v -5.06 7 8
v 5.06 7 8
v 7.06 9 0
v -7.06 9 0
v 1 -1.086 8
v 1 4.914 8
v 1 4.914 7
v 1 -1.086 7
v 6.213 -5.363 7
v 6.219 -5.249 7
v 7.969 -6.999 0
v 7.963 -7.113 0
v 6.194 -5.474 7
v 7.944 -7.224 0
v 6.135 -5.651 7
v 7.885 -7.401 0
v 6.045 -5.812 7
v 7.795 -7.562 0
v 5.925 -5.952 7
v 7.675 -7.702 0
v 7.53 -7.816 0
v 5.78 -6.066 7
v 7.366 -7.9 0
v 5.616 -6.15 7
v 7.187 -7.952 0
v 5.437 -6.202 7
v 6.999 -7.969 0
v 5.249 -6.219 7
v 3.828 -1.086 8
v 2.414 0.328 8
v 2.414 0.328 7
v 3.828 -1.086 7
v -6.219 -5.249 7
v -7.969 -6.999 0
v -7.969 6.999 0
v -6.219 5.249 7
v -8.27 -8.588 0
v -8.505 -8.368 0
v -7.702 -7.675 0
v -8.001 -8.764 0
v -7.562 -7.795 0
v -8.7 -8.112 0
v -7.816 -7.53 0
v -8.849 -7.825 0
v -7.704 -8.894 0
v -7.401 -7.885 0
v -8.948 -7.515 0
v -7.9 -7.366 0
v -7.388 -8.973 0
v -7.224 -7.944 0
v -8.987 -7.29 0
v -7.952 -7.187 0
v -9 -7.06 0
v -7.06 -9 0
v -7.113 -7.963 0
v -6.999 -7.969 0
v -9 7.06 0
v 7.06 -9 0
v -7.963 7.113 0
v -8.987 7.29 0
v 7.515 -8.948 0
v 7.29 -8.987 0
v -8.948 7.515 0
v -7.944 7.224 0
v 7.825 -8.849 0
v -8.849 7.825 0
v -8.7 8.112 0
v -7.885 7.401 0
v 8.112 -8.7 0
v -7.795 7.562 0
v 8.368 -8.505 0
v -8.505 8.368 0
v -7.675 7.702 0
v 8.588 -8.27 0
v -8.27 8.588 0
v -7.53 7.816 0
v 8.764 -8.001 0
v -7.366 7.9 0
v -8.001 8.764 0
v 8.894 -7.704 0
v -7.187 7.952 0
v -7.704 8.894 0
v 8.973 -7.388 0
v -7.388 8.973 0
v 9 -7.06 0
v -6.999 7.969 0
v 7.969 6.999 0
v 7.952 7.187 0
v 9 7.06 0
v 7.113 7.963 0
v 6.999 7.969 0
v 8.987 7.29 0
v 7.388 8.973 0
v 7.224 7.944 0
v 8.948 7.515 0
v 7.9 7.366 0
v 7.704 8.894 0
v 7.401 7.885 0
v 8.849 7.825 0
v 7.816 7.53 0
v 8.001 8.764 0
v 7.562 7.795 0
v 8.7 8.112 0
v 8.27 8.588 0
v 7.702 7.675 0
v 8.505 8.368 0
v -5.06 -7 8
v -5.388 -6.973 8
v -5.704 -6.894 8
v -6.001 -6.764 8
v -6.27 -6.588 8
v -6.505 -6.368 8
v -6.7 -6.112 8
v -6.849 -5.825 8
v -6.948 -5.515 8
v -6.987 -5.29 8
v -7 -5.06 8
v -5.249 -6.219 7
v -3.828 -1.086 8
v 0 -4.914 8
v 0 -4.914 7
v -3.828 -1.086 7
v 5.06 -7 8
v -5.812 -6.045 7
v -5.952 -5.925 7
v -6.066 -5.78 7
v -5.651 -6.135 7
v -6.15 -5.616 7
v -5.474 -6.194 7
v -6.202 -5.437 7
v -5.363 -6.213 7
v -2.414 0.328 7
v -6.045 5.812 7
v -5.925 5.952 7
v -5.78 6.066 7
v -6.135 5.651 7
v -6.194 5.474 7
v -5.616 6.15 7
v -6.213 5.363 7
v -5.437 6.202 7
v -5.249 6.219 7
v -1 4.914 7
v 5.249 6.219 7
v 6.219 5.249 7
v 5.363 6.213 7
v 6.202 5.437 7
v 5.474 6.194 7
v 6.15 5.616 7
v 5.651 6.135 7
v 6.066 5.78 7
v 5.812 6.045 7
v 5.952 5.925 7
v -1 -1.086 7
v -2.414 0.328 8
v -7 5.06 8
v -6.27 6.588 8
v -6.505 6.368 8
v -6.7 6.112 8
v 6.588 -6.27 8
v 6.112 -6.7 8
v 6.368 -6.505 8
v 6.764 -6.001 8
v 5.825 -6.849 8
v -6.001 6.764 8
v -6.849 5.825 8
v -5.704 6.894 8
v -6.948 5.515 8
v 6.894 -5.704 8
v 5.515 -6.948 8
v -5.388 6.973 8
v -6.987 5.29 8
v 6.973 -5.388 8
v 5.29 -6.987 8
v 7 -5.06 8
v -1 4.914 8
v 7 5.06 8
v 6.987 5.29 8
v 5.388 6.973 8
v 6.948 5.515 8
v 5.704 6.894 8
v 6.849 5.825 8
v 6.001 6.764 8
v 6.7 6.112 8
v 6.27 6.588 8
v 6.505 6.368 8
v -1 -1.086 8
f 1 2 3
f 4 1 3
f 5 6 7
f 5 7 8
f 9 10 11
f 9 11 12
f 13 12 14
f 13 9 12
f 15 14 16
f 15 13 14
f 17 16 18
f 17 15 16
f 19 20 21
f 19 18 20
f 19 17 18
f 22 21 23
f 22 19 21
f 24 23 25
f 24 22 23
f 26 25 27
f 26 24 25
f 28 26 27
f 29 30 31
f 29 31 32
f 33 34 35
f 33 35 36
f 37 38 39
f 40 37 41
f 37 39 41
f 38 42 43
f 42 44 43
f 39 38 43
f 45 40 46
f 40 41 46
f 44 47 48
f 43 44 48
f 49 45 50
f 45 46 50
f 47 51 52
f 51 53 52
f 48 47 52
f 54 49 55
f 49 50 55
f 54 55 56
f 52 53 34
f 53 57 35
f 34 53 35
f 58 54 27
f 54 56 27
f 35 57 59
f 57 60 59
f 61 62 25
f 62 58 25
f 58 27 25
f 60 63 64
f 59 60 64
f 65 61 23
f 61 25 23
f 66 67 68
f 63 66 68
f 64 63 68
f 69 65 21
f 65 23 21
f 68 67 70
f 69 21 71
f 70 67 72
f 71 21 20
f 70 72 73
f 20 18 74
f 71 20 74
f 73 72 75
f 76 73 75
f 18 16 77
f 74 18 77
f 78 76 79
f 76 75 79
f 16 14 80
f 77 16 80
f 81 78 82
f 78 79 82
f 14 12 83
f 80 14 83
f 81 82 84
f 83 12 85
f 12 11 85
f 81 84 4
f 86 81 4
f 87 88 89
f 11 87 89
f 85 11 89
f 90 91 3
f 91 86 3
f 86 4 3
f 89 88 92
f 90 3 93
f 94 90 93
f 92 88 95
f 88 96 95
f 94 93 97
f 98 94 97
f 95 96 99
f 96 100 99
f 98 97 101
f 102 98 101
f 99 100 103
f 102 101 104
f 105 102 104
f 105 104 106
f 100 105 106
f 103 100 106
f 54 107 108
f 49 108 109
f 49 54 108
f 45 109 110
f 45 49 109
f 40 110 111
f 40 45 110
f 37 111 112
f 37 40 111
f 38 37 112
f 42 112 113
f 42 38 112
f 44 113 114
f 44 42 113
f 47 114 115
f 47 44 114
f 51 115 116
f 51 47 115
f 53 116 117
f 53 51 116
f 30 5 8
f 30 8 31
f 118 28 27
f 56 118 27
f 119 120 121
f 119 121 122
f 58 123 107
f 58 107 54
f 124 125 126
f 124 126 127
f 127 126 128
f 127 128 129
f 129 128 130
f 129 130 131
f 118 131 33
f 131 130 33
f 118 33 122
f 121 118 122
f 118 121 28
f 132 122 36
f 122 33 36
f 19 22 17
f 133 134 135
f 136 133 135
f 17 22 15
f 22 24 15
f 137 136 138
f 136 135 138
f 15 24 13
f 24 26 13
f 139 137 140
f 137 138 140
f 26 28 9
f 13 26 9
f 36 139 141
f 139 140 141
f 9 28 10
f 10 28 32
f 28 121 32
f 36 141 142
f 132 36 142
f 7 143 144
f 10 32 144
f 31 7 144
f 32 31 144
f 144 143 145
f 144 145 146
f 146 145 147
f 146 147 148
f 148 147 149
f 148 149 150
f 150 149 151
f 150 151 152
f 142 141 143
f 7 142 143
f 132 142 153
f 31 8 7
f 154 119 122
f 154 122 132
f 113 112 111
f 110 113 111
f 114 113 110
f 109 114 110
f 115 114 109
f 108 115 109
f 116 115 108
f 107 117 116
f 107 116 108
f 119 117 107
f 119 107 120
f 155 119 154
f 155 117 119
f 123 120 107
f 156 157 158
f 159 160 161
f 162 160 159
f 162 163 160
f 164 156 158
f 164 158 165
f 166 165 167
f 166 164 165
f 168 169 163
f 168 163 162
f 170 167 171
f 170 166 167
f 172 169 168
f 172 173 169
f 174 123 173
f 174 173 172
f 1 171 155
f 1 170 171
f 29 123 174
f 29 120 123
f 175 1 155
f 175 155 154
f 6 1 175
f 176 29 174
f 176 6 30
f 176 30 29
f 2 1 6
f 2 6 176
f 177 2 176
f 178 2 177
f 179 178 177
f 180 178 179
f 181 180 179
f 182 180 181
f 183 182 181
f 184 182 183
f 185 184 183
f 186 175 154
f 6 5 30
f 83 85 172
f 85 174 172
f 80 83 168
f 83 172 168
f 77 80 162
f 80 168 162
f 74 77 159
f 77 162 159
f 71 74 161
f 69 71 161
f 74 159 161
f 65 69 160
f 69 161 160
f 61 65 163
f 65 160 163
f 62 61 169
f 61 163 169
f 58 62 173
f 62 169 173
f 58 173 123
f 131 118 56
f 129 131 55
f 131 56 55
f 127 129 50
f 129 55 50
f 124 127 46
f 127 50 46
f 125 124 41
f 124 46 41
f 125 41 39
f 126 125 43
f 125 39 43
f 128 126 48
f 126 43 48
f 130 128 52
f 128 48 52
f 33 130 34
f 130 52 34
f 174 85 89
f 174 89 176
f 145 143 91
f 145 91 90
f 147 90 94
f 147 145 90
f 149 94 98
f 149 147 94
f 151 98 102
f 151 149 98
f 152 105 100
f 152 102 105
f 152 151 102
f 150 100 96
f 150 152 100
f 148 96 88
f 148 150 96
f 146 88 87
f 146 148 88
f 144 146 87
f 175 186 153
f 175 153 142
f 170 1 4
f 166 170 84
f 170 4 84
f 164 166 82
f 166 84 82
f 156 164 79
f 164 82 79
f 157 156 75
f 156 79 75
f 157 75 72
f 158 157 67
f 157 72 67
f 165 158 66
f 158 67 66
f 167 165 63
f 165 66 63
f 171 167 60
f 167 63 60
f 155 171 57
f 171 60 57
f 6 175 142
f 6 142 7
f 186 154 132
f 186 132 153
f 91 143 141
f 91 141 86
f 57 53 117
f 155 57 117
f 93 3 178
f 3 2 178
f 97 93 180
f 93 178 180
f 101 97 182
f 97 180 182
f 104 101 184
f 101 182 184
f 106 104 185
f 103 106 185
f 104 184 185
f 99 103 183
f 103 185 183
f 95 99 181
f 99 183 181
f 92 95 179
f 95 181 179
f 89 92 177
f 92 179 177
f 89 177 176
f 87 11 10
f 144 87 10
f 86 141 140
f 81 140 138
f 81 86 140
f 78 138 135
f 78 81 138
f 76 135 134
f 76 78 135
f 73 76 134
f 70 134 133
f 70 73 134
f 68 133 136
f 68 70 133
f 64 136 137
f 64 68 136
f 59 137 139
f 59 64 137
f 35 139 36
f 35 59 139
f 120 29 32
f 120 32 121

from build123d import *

# Parameters (mm, degrees)
SKETCH_W             = 18
SKETCH_H             = 18
PAD_DEPTH            = 8
POCKET_DEPTH         = 18.001
POCKET001_DEPTH      = 9.001
POCKET001_DEPTH_BACK = 9.001
FILLET_R             = 2
THICKNESS_T          = -1
POCKET002_DEPTH      = 5.01


with BuildPart() as part:
    # Sketch → Pad (new body)
    with BuildSketch(Plane.XY):
        Rectangle(SKETCH_W, SKETCH_H)
    extrude(amount=PAD_DEPTH)

    # Sketch001 (on Face1 of Pad) → Pocket (cut, through all)
    with BuildSketch(Plane.XZ.offset(9)):
        Polygon((-9, 8), (-9, 0), (-7, 8), align=None)
        Polygon((9, 8), (9, 0), (7, 8), align=None)
    extrude(amount=-POCKET_DEPTH, mode=Mode.SUBTRACT)

    # Sketch002 → Pocket001 (cut, two sides)
    with BuildSketch(Plane.YZ) as pocket001_sk:
        Polygon((-9, 8), (-7, 8), (-9, 0), align=None)
        Polygon((9, 8), (7, 8), (9, 0), align=None)
    extrude(amount=-POCKET001_DEPTH, mode=Mode.SUBTRACT)
    extrude(pocket001_sk.sketch, amount=POCKET001_DEPTH_BACK, mode=Mode.SUBTRACT)

    # Fillet
    fillet_edges = [part.edges().sort_by_distance(p)[0] for p in [
        (-8, 8, 4),
        (-8, -8, 4),
        (8, -8, 4),
        (8, 8, 4),
    ]]
    fillet(fillet_edges, radius=FILLET_R)

    # Thickness
    thickness_openings = [part.faces().sort_by_distance(p)[0] for p in [
        (0, 0, 0),
    ]]
    offset(amount=THICKNESS_T, openings=thickness_openings, kind=Kind.INTERSECTION)

    # Sketch003 (on Face9 of Thickness) → Pocket002 (cut)
    with BuildSketch(Plane.XY.offset(8)):
        Polygon((-1, 4.914214), (1, 4.914214), (1, -1.085786), (2.414214, 0.328427), (3.828427, -1.085786), (0, -4.914214), (-3.828427, -1.085786), (-2.414214, 0.328427), (-1, -1.085786), align=None)
    extrude(amount=-POCKET002_DEPTH, mode=Mode.SUBTRACT)


solid = part.part
